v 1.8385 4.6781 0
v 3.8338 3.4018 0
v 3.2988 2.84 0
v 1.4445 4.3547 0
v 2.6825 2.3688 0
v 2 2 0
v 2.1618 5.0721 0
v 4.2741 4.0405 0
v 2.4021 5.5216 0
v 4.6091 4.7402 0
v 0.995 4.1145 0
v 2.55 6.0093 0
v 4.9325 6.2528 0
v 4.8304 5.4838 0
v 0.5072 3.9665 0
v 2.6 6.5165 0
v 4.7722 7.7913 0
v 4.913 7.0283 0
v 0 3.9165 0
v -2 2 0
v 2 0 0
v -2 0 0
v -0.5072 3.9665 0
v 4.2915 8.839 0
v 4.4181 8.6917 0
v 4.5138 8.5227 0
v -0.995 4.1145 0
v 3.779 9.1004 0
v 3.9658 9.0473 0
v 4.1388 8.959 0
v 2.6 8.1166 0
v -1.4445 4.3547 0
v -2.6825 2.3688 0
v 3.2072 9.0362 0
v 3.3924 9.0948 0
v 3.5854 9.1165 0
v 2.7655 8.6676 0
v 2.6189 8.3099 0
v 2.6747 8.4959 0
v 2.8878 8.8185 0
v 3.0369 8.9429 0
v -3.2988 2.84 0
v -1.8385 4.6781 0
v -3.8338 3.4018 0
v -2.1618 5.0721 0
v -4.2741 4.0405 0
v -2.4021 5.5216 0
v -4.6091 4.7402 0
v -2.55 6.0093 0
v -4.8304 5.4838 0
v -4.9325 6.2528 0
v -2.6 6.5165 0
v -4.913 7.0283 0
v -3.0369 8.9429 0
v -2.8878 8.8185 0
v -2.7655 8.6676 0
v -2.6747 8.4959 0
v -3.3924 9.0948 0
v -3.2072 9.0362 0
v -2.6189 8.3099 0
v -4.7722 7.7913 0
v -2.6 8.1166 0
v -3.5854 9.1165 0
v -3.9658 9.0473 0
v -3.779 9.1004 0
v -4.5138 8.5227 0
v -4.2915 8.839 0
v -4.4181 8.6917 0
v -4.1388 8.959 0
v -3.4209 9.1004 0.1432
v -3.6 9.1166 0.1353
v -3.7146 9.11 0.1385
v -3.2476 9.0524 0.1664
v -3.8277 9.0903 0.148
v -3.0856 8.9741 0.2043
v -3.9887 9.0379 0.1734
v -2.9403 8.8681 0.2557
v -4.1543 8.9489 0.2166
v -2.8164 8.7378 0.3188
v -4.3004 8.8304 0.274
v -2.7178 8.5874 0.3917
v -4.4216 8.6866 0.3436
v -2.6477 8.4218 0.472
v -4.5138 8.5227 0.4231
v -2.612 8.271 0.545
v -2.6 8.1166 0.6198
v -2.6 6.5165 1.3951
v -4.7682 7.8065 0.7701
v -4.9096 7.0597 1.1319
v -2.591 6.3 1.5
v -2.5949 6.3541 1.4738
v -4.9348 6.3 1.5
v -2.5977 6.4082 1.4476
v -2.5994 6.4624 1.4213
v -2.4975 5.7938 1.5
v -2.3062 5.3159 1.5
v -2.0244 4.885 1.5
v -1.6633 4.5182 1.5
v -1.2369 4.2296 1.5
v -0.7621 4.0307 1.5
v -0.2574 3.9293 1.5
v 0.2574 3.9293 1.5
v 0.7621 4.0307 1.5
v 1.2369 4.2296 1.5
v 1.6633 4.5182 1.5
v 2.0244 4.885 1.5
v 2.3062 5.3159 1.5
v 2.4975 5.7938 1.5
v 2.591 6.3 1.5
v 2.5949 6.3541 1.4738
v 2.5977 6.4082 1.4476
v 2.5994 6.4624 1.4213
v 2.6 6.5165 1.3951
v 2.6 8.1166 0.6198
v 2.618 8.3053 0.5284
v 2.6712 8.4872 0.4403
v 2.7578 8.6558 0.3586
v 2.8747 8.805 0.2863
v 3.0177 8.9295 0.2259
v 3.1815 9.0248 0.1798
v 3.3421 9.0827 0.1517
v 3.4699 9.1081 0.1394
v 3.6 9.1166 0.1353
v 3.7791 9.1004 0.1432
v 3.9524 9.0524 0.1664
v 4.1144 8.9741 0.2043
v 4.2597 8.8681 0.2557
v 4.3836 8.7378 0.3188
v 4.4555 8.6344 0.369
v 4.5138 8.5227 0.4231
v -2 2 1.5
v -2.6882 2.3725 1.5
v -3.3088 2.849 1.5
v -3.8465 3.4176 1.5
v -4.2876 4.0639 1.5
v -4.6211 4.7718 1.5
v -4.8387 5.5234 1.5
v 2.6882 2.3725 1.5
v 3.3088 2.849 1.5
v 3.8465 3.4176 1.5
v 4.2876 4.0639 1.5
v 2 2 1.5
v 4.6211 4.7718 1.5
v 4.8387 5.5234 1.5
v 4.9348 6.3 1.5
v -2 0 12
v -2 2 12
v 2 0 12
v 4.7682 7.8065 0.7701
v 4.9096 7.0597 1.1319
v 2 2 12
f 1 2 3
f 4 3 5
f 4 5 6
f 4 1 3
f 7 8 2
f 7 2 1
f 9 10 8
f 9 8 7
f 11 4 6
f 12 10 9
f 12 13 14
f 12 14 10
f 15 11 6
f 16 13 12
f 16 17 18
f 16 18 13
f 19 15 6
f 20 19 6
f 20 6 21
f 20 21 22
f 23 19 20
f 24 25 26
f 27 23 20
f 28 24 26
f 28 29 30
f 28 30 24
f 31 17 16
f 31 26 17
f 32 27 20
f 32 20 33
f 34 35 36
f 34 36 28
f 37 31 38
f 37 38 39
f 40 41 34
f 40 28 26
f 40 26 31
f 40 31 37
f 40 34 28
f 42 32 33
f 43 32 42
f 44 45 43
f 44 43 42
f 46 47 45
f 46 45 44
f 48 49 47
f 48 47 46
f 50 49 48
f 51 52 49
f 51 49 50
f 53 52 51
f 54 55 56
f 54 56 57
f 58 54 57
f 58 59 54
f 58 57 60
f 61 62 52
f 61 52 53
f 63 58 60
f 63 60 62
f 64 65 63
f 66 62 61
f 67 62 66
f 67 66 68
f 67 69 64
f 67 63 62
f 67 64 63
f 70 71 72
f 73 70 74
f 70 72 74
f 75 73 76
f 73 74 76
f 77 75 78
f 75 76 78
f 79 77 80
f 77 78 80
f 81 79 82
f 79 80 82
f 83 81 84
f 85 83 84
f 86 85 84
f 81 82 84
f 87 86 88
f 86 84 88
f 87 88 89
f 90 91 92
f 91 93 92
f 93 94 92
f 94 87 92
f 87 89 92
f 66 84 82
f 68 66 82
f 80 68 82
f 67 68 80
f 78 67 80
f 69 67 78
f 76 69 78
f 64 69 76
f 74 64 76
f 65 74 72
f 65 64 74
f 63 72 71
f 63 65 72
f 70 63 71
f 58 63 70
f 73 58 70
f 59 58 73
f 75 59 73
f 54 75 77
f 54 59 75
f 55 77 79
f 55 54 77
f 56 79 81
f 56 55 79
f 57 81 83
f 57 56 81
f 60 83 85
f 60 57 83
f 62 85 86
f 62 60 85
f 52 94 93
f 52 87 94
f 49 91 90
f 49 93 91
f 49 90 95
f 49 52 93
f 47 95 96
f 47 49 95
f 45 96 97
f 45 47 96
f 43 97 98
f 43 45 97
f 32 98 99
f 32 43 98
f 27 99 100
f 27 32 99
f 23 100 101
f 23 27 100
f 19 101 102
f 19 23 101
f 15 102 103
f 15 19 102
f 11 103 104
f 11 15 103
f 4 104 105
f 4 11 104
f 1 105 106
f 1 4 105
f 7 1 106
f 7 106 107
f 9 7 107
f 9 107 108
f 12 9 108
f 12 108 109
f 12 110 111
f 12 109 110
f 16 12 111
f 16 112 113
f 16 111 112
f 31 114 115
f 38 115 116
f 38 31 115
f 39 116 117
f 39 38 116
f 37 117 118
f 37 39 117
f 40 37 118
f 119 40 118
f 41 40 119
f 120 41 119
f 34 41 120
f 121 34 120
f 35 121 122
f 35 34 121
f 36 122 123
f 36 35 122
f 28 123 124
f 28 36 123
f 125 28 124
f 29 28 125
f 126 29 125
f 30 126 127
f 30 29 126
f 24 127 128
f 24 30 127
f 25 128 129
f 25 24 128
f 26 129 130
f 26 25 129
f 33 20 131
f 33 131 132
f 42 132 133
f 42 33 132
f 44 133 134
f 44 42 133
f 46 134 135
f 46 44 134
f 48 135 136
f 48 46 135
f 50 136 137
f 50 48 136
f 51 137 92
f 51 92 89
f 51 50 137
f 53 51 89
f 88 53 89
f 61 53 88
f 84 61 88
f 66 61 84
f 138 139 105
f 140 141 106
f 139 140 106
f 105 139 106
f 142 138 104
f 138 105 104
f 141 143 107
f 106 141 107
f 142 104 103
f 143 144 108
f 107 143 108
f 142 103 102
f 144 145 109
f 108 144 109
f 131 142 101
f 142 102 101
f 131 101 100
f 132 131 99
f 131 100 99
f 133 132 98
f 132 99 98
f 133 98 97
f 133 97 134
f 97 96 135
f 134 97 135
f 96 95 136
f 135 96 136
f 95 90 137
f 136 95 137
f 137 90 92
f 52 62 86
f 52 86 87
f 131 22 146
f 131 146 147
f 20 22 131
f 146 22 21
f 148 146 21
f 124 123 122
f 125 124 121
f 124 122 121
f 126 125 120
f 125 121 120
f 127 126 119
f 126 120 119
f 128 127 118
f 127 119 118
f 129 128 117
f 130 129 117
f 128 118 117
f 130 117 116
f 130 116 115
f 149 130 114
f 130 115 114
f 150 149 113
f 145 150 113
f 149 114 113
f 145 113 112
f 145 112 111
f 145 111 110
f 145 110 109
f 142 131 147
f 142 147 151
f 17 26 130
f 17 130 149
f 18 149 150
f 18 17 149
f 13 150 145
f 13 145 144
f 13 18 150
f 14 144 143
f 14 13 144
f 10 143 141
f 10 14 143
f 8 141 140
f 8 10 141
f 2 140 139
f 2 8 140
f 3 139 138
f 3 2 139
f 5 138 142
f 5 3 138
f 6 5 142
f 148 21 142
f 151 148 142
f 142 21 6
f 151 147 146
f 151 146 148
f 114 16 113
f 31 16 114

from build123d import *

# Parameters (mm, degrees)
SKETCH1_W               = 4
SKETCH1_H               = 2
BOSS_EXTRUDE1_DEPTH     = 12
BOSS_EXTRUDE2_DEPTH     = 1.5
CUT_EXTRUDE2_DEPTH      = 16.859104004
CUT_EXTRUDE2_DEPTH_BACK = 16.859104004


with BuildPart() as part:
    # Sketch1 → Boss-Extrude1 (new body)
    with BuildSketch(Plane.XY):
        with Locations((0, 1)):
            Rectangle(SKETCH1_W, SKETCH1_H)
    extrude(amount=BOSS_EXTRUDE1_DEPTH)

    # Sketch2 → Boss-Extrude2 (add)
    with BuildSketch(Plane(origin=(0, 0, 0), x_dir=(-1, 0, 0), z_dir=(0, 0, -1))):
        with BuildLine():
            Line((-2.6, 6.516547752), (-2.6, 8.116577001))
            ThreePointArc((-2.6, 8.116577001), (-3.392405194, 9.094791904), (-4.513808793, 8.522721667))
            ThreePointArc((-4.513808793, 8.522721667), (0, 1.576992752), (4.513808793, 8.522721667))
            ThreePointArc((4.513808793, 8.522721667), (3.392405194, 9.094791904), (2.6, 8.116577001))
            Line((2.6, 8.116577001), (2.6, 6.516547752))
            ThreePointArc((2.6, 6.516547752), (0, 3.916547752), (-2.6, 6.516547752))
        make_face()
    extrude(amount=-BOSS_EXTRUDE2_DEPTH)

    # Sketch3 → Cut-Extrude2 (cut, two sides: drawn at the far end of the back side and taken through both)
    with BuildSketch(Plane(origin=(0, 0, 0), x_dir=(0, 0, -1), z_dir=(1, 0, 0)).offset(-CUT_EXTRUDE2_DEPTH_BACK)):
        Polygon((-0.13532, 9.116577001), (-1.5, 6.3), (-1.5, 9.116577001), align=None)
    extrude(amount=CUT_EXTRUDE2_DEPTH + CUT_EXTRUDE2_DEPTH_BACK, mode=Mode.SUBTRACT)


solid = part.part
